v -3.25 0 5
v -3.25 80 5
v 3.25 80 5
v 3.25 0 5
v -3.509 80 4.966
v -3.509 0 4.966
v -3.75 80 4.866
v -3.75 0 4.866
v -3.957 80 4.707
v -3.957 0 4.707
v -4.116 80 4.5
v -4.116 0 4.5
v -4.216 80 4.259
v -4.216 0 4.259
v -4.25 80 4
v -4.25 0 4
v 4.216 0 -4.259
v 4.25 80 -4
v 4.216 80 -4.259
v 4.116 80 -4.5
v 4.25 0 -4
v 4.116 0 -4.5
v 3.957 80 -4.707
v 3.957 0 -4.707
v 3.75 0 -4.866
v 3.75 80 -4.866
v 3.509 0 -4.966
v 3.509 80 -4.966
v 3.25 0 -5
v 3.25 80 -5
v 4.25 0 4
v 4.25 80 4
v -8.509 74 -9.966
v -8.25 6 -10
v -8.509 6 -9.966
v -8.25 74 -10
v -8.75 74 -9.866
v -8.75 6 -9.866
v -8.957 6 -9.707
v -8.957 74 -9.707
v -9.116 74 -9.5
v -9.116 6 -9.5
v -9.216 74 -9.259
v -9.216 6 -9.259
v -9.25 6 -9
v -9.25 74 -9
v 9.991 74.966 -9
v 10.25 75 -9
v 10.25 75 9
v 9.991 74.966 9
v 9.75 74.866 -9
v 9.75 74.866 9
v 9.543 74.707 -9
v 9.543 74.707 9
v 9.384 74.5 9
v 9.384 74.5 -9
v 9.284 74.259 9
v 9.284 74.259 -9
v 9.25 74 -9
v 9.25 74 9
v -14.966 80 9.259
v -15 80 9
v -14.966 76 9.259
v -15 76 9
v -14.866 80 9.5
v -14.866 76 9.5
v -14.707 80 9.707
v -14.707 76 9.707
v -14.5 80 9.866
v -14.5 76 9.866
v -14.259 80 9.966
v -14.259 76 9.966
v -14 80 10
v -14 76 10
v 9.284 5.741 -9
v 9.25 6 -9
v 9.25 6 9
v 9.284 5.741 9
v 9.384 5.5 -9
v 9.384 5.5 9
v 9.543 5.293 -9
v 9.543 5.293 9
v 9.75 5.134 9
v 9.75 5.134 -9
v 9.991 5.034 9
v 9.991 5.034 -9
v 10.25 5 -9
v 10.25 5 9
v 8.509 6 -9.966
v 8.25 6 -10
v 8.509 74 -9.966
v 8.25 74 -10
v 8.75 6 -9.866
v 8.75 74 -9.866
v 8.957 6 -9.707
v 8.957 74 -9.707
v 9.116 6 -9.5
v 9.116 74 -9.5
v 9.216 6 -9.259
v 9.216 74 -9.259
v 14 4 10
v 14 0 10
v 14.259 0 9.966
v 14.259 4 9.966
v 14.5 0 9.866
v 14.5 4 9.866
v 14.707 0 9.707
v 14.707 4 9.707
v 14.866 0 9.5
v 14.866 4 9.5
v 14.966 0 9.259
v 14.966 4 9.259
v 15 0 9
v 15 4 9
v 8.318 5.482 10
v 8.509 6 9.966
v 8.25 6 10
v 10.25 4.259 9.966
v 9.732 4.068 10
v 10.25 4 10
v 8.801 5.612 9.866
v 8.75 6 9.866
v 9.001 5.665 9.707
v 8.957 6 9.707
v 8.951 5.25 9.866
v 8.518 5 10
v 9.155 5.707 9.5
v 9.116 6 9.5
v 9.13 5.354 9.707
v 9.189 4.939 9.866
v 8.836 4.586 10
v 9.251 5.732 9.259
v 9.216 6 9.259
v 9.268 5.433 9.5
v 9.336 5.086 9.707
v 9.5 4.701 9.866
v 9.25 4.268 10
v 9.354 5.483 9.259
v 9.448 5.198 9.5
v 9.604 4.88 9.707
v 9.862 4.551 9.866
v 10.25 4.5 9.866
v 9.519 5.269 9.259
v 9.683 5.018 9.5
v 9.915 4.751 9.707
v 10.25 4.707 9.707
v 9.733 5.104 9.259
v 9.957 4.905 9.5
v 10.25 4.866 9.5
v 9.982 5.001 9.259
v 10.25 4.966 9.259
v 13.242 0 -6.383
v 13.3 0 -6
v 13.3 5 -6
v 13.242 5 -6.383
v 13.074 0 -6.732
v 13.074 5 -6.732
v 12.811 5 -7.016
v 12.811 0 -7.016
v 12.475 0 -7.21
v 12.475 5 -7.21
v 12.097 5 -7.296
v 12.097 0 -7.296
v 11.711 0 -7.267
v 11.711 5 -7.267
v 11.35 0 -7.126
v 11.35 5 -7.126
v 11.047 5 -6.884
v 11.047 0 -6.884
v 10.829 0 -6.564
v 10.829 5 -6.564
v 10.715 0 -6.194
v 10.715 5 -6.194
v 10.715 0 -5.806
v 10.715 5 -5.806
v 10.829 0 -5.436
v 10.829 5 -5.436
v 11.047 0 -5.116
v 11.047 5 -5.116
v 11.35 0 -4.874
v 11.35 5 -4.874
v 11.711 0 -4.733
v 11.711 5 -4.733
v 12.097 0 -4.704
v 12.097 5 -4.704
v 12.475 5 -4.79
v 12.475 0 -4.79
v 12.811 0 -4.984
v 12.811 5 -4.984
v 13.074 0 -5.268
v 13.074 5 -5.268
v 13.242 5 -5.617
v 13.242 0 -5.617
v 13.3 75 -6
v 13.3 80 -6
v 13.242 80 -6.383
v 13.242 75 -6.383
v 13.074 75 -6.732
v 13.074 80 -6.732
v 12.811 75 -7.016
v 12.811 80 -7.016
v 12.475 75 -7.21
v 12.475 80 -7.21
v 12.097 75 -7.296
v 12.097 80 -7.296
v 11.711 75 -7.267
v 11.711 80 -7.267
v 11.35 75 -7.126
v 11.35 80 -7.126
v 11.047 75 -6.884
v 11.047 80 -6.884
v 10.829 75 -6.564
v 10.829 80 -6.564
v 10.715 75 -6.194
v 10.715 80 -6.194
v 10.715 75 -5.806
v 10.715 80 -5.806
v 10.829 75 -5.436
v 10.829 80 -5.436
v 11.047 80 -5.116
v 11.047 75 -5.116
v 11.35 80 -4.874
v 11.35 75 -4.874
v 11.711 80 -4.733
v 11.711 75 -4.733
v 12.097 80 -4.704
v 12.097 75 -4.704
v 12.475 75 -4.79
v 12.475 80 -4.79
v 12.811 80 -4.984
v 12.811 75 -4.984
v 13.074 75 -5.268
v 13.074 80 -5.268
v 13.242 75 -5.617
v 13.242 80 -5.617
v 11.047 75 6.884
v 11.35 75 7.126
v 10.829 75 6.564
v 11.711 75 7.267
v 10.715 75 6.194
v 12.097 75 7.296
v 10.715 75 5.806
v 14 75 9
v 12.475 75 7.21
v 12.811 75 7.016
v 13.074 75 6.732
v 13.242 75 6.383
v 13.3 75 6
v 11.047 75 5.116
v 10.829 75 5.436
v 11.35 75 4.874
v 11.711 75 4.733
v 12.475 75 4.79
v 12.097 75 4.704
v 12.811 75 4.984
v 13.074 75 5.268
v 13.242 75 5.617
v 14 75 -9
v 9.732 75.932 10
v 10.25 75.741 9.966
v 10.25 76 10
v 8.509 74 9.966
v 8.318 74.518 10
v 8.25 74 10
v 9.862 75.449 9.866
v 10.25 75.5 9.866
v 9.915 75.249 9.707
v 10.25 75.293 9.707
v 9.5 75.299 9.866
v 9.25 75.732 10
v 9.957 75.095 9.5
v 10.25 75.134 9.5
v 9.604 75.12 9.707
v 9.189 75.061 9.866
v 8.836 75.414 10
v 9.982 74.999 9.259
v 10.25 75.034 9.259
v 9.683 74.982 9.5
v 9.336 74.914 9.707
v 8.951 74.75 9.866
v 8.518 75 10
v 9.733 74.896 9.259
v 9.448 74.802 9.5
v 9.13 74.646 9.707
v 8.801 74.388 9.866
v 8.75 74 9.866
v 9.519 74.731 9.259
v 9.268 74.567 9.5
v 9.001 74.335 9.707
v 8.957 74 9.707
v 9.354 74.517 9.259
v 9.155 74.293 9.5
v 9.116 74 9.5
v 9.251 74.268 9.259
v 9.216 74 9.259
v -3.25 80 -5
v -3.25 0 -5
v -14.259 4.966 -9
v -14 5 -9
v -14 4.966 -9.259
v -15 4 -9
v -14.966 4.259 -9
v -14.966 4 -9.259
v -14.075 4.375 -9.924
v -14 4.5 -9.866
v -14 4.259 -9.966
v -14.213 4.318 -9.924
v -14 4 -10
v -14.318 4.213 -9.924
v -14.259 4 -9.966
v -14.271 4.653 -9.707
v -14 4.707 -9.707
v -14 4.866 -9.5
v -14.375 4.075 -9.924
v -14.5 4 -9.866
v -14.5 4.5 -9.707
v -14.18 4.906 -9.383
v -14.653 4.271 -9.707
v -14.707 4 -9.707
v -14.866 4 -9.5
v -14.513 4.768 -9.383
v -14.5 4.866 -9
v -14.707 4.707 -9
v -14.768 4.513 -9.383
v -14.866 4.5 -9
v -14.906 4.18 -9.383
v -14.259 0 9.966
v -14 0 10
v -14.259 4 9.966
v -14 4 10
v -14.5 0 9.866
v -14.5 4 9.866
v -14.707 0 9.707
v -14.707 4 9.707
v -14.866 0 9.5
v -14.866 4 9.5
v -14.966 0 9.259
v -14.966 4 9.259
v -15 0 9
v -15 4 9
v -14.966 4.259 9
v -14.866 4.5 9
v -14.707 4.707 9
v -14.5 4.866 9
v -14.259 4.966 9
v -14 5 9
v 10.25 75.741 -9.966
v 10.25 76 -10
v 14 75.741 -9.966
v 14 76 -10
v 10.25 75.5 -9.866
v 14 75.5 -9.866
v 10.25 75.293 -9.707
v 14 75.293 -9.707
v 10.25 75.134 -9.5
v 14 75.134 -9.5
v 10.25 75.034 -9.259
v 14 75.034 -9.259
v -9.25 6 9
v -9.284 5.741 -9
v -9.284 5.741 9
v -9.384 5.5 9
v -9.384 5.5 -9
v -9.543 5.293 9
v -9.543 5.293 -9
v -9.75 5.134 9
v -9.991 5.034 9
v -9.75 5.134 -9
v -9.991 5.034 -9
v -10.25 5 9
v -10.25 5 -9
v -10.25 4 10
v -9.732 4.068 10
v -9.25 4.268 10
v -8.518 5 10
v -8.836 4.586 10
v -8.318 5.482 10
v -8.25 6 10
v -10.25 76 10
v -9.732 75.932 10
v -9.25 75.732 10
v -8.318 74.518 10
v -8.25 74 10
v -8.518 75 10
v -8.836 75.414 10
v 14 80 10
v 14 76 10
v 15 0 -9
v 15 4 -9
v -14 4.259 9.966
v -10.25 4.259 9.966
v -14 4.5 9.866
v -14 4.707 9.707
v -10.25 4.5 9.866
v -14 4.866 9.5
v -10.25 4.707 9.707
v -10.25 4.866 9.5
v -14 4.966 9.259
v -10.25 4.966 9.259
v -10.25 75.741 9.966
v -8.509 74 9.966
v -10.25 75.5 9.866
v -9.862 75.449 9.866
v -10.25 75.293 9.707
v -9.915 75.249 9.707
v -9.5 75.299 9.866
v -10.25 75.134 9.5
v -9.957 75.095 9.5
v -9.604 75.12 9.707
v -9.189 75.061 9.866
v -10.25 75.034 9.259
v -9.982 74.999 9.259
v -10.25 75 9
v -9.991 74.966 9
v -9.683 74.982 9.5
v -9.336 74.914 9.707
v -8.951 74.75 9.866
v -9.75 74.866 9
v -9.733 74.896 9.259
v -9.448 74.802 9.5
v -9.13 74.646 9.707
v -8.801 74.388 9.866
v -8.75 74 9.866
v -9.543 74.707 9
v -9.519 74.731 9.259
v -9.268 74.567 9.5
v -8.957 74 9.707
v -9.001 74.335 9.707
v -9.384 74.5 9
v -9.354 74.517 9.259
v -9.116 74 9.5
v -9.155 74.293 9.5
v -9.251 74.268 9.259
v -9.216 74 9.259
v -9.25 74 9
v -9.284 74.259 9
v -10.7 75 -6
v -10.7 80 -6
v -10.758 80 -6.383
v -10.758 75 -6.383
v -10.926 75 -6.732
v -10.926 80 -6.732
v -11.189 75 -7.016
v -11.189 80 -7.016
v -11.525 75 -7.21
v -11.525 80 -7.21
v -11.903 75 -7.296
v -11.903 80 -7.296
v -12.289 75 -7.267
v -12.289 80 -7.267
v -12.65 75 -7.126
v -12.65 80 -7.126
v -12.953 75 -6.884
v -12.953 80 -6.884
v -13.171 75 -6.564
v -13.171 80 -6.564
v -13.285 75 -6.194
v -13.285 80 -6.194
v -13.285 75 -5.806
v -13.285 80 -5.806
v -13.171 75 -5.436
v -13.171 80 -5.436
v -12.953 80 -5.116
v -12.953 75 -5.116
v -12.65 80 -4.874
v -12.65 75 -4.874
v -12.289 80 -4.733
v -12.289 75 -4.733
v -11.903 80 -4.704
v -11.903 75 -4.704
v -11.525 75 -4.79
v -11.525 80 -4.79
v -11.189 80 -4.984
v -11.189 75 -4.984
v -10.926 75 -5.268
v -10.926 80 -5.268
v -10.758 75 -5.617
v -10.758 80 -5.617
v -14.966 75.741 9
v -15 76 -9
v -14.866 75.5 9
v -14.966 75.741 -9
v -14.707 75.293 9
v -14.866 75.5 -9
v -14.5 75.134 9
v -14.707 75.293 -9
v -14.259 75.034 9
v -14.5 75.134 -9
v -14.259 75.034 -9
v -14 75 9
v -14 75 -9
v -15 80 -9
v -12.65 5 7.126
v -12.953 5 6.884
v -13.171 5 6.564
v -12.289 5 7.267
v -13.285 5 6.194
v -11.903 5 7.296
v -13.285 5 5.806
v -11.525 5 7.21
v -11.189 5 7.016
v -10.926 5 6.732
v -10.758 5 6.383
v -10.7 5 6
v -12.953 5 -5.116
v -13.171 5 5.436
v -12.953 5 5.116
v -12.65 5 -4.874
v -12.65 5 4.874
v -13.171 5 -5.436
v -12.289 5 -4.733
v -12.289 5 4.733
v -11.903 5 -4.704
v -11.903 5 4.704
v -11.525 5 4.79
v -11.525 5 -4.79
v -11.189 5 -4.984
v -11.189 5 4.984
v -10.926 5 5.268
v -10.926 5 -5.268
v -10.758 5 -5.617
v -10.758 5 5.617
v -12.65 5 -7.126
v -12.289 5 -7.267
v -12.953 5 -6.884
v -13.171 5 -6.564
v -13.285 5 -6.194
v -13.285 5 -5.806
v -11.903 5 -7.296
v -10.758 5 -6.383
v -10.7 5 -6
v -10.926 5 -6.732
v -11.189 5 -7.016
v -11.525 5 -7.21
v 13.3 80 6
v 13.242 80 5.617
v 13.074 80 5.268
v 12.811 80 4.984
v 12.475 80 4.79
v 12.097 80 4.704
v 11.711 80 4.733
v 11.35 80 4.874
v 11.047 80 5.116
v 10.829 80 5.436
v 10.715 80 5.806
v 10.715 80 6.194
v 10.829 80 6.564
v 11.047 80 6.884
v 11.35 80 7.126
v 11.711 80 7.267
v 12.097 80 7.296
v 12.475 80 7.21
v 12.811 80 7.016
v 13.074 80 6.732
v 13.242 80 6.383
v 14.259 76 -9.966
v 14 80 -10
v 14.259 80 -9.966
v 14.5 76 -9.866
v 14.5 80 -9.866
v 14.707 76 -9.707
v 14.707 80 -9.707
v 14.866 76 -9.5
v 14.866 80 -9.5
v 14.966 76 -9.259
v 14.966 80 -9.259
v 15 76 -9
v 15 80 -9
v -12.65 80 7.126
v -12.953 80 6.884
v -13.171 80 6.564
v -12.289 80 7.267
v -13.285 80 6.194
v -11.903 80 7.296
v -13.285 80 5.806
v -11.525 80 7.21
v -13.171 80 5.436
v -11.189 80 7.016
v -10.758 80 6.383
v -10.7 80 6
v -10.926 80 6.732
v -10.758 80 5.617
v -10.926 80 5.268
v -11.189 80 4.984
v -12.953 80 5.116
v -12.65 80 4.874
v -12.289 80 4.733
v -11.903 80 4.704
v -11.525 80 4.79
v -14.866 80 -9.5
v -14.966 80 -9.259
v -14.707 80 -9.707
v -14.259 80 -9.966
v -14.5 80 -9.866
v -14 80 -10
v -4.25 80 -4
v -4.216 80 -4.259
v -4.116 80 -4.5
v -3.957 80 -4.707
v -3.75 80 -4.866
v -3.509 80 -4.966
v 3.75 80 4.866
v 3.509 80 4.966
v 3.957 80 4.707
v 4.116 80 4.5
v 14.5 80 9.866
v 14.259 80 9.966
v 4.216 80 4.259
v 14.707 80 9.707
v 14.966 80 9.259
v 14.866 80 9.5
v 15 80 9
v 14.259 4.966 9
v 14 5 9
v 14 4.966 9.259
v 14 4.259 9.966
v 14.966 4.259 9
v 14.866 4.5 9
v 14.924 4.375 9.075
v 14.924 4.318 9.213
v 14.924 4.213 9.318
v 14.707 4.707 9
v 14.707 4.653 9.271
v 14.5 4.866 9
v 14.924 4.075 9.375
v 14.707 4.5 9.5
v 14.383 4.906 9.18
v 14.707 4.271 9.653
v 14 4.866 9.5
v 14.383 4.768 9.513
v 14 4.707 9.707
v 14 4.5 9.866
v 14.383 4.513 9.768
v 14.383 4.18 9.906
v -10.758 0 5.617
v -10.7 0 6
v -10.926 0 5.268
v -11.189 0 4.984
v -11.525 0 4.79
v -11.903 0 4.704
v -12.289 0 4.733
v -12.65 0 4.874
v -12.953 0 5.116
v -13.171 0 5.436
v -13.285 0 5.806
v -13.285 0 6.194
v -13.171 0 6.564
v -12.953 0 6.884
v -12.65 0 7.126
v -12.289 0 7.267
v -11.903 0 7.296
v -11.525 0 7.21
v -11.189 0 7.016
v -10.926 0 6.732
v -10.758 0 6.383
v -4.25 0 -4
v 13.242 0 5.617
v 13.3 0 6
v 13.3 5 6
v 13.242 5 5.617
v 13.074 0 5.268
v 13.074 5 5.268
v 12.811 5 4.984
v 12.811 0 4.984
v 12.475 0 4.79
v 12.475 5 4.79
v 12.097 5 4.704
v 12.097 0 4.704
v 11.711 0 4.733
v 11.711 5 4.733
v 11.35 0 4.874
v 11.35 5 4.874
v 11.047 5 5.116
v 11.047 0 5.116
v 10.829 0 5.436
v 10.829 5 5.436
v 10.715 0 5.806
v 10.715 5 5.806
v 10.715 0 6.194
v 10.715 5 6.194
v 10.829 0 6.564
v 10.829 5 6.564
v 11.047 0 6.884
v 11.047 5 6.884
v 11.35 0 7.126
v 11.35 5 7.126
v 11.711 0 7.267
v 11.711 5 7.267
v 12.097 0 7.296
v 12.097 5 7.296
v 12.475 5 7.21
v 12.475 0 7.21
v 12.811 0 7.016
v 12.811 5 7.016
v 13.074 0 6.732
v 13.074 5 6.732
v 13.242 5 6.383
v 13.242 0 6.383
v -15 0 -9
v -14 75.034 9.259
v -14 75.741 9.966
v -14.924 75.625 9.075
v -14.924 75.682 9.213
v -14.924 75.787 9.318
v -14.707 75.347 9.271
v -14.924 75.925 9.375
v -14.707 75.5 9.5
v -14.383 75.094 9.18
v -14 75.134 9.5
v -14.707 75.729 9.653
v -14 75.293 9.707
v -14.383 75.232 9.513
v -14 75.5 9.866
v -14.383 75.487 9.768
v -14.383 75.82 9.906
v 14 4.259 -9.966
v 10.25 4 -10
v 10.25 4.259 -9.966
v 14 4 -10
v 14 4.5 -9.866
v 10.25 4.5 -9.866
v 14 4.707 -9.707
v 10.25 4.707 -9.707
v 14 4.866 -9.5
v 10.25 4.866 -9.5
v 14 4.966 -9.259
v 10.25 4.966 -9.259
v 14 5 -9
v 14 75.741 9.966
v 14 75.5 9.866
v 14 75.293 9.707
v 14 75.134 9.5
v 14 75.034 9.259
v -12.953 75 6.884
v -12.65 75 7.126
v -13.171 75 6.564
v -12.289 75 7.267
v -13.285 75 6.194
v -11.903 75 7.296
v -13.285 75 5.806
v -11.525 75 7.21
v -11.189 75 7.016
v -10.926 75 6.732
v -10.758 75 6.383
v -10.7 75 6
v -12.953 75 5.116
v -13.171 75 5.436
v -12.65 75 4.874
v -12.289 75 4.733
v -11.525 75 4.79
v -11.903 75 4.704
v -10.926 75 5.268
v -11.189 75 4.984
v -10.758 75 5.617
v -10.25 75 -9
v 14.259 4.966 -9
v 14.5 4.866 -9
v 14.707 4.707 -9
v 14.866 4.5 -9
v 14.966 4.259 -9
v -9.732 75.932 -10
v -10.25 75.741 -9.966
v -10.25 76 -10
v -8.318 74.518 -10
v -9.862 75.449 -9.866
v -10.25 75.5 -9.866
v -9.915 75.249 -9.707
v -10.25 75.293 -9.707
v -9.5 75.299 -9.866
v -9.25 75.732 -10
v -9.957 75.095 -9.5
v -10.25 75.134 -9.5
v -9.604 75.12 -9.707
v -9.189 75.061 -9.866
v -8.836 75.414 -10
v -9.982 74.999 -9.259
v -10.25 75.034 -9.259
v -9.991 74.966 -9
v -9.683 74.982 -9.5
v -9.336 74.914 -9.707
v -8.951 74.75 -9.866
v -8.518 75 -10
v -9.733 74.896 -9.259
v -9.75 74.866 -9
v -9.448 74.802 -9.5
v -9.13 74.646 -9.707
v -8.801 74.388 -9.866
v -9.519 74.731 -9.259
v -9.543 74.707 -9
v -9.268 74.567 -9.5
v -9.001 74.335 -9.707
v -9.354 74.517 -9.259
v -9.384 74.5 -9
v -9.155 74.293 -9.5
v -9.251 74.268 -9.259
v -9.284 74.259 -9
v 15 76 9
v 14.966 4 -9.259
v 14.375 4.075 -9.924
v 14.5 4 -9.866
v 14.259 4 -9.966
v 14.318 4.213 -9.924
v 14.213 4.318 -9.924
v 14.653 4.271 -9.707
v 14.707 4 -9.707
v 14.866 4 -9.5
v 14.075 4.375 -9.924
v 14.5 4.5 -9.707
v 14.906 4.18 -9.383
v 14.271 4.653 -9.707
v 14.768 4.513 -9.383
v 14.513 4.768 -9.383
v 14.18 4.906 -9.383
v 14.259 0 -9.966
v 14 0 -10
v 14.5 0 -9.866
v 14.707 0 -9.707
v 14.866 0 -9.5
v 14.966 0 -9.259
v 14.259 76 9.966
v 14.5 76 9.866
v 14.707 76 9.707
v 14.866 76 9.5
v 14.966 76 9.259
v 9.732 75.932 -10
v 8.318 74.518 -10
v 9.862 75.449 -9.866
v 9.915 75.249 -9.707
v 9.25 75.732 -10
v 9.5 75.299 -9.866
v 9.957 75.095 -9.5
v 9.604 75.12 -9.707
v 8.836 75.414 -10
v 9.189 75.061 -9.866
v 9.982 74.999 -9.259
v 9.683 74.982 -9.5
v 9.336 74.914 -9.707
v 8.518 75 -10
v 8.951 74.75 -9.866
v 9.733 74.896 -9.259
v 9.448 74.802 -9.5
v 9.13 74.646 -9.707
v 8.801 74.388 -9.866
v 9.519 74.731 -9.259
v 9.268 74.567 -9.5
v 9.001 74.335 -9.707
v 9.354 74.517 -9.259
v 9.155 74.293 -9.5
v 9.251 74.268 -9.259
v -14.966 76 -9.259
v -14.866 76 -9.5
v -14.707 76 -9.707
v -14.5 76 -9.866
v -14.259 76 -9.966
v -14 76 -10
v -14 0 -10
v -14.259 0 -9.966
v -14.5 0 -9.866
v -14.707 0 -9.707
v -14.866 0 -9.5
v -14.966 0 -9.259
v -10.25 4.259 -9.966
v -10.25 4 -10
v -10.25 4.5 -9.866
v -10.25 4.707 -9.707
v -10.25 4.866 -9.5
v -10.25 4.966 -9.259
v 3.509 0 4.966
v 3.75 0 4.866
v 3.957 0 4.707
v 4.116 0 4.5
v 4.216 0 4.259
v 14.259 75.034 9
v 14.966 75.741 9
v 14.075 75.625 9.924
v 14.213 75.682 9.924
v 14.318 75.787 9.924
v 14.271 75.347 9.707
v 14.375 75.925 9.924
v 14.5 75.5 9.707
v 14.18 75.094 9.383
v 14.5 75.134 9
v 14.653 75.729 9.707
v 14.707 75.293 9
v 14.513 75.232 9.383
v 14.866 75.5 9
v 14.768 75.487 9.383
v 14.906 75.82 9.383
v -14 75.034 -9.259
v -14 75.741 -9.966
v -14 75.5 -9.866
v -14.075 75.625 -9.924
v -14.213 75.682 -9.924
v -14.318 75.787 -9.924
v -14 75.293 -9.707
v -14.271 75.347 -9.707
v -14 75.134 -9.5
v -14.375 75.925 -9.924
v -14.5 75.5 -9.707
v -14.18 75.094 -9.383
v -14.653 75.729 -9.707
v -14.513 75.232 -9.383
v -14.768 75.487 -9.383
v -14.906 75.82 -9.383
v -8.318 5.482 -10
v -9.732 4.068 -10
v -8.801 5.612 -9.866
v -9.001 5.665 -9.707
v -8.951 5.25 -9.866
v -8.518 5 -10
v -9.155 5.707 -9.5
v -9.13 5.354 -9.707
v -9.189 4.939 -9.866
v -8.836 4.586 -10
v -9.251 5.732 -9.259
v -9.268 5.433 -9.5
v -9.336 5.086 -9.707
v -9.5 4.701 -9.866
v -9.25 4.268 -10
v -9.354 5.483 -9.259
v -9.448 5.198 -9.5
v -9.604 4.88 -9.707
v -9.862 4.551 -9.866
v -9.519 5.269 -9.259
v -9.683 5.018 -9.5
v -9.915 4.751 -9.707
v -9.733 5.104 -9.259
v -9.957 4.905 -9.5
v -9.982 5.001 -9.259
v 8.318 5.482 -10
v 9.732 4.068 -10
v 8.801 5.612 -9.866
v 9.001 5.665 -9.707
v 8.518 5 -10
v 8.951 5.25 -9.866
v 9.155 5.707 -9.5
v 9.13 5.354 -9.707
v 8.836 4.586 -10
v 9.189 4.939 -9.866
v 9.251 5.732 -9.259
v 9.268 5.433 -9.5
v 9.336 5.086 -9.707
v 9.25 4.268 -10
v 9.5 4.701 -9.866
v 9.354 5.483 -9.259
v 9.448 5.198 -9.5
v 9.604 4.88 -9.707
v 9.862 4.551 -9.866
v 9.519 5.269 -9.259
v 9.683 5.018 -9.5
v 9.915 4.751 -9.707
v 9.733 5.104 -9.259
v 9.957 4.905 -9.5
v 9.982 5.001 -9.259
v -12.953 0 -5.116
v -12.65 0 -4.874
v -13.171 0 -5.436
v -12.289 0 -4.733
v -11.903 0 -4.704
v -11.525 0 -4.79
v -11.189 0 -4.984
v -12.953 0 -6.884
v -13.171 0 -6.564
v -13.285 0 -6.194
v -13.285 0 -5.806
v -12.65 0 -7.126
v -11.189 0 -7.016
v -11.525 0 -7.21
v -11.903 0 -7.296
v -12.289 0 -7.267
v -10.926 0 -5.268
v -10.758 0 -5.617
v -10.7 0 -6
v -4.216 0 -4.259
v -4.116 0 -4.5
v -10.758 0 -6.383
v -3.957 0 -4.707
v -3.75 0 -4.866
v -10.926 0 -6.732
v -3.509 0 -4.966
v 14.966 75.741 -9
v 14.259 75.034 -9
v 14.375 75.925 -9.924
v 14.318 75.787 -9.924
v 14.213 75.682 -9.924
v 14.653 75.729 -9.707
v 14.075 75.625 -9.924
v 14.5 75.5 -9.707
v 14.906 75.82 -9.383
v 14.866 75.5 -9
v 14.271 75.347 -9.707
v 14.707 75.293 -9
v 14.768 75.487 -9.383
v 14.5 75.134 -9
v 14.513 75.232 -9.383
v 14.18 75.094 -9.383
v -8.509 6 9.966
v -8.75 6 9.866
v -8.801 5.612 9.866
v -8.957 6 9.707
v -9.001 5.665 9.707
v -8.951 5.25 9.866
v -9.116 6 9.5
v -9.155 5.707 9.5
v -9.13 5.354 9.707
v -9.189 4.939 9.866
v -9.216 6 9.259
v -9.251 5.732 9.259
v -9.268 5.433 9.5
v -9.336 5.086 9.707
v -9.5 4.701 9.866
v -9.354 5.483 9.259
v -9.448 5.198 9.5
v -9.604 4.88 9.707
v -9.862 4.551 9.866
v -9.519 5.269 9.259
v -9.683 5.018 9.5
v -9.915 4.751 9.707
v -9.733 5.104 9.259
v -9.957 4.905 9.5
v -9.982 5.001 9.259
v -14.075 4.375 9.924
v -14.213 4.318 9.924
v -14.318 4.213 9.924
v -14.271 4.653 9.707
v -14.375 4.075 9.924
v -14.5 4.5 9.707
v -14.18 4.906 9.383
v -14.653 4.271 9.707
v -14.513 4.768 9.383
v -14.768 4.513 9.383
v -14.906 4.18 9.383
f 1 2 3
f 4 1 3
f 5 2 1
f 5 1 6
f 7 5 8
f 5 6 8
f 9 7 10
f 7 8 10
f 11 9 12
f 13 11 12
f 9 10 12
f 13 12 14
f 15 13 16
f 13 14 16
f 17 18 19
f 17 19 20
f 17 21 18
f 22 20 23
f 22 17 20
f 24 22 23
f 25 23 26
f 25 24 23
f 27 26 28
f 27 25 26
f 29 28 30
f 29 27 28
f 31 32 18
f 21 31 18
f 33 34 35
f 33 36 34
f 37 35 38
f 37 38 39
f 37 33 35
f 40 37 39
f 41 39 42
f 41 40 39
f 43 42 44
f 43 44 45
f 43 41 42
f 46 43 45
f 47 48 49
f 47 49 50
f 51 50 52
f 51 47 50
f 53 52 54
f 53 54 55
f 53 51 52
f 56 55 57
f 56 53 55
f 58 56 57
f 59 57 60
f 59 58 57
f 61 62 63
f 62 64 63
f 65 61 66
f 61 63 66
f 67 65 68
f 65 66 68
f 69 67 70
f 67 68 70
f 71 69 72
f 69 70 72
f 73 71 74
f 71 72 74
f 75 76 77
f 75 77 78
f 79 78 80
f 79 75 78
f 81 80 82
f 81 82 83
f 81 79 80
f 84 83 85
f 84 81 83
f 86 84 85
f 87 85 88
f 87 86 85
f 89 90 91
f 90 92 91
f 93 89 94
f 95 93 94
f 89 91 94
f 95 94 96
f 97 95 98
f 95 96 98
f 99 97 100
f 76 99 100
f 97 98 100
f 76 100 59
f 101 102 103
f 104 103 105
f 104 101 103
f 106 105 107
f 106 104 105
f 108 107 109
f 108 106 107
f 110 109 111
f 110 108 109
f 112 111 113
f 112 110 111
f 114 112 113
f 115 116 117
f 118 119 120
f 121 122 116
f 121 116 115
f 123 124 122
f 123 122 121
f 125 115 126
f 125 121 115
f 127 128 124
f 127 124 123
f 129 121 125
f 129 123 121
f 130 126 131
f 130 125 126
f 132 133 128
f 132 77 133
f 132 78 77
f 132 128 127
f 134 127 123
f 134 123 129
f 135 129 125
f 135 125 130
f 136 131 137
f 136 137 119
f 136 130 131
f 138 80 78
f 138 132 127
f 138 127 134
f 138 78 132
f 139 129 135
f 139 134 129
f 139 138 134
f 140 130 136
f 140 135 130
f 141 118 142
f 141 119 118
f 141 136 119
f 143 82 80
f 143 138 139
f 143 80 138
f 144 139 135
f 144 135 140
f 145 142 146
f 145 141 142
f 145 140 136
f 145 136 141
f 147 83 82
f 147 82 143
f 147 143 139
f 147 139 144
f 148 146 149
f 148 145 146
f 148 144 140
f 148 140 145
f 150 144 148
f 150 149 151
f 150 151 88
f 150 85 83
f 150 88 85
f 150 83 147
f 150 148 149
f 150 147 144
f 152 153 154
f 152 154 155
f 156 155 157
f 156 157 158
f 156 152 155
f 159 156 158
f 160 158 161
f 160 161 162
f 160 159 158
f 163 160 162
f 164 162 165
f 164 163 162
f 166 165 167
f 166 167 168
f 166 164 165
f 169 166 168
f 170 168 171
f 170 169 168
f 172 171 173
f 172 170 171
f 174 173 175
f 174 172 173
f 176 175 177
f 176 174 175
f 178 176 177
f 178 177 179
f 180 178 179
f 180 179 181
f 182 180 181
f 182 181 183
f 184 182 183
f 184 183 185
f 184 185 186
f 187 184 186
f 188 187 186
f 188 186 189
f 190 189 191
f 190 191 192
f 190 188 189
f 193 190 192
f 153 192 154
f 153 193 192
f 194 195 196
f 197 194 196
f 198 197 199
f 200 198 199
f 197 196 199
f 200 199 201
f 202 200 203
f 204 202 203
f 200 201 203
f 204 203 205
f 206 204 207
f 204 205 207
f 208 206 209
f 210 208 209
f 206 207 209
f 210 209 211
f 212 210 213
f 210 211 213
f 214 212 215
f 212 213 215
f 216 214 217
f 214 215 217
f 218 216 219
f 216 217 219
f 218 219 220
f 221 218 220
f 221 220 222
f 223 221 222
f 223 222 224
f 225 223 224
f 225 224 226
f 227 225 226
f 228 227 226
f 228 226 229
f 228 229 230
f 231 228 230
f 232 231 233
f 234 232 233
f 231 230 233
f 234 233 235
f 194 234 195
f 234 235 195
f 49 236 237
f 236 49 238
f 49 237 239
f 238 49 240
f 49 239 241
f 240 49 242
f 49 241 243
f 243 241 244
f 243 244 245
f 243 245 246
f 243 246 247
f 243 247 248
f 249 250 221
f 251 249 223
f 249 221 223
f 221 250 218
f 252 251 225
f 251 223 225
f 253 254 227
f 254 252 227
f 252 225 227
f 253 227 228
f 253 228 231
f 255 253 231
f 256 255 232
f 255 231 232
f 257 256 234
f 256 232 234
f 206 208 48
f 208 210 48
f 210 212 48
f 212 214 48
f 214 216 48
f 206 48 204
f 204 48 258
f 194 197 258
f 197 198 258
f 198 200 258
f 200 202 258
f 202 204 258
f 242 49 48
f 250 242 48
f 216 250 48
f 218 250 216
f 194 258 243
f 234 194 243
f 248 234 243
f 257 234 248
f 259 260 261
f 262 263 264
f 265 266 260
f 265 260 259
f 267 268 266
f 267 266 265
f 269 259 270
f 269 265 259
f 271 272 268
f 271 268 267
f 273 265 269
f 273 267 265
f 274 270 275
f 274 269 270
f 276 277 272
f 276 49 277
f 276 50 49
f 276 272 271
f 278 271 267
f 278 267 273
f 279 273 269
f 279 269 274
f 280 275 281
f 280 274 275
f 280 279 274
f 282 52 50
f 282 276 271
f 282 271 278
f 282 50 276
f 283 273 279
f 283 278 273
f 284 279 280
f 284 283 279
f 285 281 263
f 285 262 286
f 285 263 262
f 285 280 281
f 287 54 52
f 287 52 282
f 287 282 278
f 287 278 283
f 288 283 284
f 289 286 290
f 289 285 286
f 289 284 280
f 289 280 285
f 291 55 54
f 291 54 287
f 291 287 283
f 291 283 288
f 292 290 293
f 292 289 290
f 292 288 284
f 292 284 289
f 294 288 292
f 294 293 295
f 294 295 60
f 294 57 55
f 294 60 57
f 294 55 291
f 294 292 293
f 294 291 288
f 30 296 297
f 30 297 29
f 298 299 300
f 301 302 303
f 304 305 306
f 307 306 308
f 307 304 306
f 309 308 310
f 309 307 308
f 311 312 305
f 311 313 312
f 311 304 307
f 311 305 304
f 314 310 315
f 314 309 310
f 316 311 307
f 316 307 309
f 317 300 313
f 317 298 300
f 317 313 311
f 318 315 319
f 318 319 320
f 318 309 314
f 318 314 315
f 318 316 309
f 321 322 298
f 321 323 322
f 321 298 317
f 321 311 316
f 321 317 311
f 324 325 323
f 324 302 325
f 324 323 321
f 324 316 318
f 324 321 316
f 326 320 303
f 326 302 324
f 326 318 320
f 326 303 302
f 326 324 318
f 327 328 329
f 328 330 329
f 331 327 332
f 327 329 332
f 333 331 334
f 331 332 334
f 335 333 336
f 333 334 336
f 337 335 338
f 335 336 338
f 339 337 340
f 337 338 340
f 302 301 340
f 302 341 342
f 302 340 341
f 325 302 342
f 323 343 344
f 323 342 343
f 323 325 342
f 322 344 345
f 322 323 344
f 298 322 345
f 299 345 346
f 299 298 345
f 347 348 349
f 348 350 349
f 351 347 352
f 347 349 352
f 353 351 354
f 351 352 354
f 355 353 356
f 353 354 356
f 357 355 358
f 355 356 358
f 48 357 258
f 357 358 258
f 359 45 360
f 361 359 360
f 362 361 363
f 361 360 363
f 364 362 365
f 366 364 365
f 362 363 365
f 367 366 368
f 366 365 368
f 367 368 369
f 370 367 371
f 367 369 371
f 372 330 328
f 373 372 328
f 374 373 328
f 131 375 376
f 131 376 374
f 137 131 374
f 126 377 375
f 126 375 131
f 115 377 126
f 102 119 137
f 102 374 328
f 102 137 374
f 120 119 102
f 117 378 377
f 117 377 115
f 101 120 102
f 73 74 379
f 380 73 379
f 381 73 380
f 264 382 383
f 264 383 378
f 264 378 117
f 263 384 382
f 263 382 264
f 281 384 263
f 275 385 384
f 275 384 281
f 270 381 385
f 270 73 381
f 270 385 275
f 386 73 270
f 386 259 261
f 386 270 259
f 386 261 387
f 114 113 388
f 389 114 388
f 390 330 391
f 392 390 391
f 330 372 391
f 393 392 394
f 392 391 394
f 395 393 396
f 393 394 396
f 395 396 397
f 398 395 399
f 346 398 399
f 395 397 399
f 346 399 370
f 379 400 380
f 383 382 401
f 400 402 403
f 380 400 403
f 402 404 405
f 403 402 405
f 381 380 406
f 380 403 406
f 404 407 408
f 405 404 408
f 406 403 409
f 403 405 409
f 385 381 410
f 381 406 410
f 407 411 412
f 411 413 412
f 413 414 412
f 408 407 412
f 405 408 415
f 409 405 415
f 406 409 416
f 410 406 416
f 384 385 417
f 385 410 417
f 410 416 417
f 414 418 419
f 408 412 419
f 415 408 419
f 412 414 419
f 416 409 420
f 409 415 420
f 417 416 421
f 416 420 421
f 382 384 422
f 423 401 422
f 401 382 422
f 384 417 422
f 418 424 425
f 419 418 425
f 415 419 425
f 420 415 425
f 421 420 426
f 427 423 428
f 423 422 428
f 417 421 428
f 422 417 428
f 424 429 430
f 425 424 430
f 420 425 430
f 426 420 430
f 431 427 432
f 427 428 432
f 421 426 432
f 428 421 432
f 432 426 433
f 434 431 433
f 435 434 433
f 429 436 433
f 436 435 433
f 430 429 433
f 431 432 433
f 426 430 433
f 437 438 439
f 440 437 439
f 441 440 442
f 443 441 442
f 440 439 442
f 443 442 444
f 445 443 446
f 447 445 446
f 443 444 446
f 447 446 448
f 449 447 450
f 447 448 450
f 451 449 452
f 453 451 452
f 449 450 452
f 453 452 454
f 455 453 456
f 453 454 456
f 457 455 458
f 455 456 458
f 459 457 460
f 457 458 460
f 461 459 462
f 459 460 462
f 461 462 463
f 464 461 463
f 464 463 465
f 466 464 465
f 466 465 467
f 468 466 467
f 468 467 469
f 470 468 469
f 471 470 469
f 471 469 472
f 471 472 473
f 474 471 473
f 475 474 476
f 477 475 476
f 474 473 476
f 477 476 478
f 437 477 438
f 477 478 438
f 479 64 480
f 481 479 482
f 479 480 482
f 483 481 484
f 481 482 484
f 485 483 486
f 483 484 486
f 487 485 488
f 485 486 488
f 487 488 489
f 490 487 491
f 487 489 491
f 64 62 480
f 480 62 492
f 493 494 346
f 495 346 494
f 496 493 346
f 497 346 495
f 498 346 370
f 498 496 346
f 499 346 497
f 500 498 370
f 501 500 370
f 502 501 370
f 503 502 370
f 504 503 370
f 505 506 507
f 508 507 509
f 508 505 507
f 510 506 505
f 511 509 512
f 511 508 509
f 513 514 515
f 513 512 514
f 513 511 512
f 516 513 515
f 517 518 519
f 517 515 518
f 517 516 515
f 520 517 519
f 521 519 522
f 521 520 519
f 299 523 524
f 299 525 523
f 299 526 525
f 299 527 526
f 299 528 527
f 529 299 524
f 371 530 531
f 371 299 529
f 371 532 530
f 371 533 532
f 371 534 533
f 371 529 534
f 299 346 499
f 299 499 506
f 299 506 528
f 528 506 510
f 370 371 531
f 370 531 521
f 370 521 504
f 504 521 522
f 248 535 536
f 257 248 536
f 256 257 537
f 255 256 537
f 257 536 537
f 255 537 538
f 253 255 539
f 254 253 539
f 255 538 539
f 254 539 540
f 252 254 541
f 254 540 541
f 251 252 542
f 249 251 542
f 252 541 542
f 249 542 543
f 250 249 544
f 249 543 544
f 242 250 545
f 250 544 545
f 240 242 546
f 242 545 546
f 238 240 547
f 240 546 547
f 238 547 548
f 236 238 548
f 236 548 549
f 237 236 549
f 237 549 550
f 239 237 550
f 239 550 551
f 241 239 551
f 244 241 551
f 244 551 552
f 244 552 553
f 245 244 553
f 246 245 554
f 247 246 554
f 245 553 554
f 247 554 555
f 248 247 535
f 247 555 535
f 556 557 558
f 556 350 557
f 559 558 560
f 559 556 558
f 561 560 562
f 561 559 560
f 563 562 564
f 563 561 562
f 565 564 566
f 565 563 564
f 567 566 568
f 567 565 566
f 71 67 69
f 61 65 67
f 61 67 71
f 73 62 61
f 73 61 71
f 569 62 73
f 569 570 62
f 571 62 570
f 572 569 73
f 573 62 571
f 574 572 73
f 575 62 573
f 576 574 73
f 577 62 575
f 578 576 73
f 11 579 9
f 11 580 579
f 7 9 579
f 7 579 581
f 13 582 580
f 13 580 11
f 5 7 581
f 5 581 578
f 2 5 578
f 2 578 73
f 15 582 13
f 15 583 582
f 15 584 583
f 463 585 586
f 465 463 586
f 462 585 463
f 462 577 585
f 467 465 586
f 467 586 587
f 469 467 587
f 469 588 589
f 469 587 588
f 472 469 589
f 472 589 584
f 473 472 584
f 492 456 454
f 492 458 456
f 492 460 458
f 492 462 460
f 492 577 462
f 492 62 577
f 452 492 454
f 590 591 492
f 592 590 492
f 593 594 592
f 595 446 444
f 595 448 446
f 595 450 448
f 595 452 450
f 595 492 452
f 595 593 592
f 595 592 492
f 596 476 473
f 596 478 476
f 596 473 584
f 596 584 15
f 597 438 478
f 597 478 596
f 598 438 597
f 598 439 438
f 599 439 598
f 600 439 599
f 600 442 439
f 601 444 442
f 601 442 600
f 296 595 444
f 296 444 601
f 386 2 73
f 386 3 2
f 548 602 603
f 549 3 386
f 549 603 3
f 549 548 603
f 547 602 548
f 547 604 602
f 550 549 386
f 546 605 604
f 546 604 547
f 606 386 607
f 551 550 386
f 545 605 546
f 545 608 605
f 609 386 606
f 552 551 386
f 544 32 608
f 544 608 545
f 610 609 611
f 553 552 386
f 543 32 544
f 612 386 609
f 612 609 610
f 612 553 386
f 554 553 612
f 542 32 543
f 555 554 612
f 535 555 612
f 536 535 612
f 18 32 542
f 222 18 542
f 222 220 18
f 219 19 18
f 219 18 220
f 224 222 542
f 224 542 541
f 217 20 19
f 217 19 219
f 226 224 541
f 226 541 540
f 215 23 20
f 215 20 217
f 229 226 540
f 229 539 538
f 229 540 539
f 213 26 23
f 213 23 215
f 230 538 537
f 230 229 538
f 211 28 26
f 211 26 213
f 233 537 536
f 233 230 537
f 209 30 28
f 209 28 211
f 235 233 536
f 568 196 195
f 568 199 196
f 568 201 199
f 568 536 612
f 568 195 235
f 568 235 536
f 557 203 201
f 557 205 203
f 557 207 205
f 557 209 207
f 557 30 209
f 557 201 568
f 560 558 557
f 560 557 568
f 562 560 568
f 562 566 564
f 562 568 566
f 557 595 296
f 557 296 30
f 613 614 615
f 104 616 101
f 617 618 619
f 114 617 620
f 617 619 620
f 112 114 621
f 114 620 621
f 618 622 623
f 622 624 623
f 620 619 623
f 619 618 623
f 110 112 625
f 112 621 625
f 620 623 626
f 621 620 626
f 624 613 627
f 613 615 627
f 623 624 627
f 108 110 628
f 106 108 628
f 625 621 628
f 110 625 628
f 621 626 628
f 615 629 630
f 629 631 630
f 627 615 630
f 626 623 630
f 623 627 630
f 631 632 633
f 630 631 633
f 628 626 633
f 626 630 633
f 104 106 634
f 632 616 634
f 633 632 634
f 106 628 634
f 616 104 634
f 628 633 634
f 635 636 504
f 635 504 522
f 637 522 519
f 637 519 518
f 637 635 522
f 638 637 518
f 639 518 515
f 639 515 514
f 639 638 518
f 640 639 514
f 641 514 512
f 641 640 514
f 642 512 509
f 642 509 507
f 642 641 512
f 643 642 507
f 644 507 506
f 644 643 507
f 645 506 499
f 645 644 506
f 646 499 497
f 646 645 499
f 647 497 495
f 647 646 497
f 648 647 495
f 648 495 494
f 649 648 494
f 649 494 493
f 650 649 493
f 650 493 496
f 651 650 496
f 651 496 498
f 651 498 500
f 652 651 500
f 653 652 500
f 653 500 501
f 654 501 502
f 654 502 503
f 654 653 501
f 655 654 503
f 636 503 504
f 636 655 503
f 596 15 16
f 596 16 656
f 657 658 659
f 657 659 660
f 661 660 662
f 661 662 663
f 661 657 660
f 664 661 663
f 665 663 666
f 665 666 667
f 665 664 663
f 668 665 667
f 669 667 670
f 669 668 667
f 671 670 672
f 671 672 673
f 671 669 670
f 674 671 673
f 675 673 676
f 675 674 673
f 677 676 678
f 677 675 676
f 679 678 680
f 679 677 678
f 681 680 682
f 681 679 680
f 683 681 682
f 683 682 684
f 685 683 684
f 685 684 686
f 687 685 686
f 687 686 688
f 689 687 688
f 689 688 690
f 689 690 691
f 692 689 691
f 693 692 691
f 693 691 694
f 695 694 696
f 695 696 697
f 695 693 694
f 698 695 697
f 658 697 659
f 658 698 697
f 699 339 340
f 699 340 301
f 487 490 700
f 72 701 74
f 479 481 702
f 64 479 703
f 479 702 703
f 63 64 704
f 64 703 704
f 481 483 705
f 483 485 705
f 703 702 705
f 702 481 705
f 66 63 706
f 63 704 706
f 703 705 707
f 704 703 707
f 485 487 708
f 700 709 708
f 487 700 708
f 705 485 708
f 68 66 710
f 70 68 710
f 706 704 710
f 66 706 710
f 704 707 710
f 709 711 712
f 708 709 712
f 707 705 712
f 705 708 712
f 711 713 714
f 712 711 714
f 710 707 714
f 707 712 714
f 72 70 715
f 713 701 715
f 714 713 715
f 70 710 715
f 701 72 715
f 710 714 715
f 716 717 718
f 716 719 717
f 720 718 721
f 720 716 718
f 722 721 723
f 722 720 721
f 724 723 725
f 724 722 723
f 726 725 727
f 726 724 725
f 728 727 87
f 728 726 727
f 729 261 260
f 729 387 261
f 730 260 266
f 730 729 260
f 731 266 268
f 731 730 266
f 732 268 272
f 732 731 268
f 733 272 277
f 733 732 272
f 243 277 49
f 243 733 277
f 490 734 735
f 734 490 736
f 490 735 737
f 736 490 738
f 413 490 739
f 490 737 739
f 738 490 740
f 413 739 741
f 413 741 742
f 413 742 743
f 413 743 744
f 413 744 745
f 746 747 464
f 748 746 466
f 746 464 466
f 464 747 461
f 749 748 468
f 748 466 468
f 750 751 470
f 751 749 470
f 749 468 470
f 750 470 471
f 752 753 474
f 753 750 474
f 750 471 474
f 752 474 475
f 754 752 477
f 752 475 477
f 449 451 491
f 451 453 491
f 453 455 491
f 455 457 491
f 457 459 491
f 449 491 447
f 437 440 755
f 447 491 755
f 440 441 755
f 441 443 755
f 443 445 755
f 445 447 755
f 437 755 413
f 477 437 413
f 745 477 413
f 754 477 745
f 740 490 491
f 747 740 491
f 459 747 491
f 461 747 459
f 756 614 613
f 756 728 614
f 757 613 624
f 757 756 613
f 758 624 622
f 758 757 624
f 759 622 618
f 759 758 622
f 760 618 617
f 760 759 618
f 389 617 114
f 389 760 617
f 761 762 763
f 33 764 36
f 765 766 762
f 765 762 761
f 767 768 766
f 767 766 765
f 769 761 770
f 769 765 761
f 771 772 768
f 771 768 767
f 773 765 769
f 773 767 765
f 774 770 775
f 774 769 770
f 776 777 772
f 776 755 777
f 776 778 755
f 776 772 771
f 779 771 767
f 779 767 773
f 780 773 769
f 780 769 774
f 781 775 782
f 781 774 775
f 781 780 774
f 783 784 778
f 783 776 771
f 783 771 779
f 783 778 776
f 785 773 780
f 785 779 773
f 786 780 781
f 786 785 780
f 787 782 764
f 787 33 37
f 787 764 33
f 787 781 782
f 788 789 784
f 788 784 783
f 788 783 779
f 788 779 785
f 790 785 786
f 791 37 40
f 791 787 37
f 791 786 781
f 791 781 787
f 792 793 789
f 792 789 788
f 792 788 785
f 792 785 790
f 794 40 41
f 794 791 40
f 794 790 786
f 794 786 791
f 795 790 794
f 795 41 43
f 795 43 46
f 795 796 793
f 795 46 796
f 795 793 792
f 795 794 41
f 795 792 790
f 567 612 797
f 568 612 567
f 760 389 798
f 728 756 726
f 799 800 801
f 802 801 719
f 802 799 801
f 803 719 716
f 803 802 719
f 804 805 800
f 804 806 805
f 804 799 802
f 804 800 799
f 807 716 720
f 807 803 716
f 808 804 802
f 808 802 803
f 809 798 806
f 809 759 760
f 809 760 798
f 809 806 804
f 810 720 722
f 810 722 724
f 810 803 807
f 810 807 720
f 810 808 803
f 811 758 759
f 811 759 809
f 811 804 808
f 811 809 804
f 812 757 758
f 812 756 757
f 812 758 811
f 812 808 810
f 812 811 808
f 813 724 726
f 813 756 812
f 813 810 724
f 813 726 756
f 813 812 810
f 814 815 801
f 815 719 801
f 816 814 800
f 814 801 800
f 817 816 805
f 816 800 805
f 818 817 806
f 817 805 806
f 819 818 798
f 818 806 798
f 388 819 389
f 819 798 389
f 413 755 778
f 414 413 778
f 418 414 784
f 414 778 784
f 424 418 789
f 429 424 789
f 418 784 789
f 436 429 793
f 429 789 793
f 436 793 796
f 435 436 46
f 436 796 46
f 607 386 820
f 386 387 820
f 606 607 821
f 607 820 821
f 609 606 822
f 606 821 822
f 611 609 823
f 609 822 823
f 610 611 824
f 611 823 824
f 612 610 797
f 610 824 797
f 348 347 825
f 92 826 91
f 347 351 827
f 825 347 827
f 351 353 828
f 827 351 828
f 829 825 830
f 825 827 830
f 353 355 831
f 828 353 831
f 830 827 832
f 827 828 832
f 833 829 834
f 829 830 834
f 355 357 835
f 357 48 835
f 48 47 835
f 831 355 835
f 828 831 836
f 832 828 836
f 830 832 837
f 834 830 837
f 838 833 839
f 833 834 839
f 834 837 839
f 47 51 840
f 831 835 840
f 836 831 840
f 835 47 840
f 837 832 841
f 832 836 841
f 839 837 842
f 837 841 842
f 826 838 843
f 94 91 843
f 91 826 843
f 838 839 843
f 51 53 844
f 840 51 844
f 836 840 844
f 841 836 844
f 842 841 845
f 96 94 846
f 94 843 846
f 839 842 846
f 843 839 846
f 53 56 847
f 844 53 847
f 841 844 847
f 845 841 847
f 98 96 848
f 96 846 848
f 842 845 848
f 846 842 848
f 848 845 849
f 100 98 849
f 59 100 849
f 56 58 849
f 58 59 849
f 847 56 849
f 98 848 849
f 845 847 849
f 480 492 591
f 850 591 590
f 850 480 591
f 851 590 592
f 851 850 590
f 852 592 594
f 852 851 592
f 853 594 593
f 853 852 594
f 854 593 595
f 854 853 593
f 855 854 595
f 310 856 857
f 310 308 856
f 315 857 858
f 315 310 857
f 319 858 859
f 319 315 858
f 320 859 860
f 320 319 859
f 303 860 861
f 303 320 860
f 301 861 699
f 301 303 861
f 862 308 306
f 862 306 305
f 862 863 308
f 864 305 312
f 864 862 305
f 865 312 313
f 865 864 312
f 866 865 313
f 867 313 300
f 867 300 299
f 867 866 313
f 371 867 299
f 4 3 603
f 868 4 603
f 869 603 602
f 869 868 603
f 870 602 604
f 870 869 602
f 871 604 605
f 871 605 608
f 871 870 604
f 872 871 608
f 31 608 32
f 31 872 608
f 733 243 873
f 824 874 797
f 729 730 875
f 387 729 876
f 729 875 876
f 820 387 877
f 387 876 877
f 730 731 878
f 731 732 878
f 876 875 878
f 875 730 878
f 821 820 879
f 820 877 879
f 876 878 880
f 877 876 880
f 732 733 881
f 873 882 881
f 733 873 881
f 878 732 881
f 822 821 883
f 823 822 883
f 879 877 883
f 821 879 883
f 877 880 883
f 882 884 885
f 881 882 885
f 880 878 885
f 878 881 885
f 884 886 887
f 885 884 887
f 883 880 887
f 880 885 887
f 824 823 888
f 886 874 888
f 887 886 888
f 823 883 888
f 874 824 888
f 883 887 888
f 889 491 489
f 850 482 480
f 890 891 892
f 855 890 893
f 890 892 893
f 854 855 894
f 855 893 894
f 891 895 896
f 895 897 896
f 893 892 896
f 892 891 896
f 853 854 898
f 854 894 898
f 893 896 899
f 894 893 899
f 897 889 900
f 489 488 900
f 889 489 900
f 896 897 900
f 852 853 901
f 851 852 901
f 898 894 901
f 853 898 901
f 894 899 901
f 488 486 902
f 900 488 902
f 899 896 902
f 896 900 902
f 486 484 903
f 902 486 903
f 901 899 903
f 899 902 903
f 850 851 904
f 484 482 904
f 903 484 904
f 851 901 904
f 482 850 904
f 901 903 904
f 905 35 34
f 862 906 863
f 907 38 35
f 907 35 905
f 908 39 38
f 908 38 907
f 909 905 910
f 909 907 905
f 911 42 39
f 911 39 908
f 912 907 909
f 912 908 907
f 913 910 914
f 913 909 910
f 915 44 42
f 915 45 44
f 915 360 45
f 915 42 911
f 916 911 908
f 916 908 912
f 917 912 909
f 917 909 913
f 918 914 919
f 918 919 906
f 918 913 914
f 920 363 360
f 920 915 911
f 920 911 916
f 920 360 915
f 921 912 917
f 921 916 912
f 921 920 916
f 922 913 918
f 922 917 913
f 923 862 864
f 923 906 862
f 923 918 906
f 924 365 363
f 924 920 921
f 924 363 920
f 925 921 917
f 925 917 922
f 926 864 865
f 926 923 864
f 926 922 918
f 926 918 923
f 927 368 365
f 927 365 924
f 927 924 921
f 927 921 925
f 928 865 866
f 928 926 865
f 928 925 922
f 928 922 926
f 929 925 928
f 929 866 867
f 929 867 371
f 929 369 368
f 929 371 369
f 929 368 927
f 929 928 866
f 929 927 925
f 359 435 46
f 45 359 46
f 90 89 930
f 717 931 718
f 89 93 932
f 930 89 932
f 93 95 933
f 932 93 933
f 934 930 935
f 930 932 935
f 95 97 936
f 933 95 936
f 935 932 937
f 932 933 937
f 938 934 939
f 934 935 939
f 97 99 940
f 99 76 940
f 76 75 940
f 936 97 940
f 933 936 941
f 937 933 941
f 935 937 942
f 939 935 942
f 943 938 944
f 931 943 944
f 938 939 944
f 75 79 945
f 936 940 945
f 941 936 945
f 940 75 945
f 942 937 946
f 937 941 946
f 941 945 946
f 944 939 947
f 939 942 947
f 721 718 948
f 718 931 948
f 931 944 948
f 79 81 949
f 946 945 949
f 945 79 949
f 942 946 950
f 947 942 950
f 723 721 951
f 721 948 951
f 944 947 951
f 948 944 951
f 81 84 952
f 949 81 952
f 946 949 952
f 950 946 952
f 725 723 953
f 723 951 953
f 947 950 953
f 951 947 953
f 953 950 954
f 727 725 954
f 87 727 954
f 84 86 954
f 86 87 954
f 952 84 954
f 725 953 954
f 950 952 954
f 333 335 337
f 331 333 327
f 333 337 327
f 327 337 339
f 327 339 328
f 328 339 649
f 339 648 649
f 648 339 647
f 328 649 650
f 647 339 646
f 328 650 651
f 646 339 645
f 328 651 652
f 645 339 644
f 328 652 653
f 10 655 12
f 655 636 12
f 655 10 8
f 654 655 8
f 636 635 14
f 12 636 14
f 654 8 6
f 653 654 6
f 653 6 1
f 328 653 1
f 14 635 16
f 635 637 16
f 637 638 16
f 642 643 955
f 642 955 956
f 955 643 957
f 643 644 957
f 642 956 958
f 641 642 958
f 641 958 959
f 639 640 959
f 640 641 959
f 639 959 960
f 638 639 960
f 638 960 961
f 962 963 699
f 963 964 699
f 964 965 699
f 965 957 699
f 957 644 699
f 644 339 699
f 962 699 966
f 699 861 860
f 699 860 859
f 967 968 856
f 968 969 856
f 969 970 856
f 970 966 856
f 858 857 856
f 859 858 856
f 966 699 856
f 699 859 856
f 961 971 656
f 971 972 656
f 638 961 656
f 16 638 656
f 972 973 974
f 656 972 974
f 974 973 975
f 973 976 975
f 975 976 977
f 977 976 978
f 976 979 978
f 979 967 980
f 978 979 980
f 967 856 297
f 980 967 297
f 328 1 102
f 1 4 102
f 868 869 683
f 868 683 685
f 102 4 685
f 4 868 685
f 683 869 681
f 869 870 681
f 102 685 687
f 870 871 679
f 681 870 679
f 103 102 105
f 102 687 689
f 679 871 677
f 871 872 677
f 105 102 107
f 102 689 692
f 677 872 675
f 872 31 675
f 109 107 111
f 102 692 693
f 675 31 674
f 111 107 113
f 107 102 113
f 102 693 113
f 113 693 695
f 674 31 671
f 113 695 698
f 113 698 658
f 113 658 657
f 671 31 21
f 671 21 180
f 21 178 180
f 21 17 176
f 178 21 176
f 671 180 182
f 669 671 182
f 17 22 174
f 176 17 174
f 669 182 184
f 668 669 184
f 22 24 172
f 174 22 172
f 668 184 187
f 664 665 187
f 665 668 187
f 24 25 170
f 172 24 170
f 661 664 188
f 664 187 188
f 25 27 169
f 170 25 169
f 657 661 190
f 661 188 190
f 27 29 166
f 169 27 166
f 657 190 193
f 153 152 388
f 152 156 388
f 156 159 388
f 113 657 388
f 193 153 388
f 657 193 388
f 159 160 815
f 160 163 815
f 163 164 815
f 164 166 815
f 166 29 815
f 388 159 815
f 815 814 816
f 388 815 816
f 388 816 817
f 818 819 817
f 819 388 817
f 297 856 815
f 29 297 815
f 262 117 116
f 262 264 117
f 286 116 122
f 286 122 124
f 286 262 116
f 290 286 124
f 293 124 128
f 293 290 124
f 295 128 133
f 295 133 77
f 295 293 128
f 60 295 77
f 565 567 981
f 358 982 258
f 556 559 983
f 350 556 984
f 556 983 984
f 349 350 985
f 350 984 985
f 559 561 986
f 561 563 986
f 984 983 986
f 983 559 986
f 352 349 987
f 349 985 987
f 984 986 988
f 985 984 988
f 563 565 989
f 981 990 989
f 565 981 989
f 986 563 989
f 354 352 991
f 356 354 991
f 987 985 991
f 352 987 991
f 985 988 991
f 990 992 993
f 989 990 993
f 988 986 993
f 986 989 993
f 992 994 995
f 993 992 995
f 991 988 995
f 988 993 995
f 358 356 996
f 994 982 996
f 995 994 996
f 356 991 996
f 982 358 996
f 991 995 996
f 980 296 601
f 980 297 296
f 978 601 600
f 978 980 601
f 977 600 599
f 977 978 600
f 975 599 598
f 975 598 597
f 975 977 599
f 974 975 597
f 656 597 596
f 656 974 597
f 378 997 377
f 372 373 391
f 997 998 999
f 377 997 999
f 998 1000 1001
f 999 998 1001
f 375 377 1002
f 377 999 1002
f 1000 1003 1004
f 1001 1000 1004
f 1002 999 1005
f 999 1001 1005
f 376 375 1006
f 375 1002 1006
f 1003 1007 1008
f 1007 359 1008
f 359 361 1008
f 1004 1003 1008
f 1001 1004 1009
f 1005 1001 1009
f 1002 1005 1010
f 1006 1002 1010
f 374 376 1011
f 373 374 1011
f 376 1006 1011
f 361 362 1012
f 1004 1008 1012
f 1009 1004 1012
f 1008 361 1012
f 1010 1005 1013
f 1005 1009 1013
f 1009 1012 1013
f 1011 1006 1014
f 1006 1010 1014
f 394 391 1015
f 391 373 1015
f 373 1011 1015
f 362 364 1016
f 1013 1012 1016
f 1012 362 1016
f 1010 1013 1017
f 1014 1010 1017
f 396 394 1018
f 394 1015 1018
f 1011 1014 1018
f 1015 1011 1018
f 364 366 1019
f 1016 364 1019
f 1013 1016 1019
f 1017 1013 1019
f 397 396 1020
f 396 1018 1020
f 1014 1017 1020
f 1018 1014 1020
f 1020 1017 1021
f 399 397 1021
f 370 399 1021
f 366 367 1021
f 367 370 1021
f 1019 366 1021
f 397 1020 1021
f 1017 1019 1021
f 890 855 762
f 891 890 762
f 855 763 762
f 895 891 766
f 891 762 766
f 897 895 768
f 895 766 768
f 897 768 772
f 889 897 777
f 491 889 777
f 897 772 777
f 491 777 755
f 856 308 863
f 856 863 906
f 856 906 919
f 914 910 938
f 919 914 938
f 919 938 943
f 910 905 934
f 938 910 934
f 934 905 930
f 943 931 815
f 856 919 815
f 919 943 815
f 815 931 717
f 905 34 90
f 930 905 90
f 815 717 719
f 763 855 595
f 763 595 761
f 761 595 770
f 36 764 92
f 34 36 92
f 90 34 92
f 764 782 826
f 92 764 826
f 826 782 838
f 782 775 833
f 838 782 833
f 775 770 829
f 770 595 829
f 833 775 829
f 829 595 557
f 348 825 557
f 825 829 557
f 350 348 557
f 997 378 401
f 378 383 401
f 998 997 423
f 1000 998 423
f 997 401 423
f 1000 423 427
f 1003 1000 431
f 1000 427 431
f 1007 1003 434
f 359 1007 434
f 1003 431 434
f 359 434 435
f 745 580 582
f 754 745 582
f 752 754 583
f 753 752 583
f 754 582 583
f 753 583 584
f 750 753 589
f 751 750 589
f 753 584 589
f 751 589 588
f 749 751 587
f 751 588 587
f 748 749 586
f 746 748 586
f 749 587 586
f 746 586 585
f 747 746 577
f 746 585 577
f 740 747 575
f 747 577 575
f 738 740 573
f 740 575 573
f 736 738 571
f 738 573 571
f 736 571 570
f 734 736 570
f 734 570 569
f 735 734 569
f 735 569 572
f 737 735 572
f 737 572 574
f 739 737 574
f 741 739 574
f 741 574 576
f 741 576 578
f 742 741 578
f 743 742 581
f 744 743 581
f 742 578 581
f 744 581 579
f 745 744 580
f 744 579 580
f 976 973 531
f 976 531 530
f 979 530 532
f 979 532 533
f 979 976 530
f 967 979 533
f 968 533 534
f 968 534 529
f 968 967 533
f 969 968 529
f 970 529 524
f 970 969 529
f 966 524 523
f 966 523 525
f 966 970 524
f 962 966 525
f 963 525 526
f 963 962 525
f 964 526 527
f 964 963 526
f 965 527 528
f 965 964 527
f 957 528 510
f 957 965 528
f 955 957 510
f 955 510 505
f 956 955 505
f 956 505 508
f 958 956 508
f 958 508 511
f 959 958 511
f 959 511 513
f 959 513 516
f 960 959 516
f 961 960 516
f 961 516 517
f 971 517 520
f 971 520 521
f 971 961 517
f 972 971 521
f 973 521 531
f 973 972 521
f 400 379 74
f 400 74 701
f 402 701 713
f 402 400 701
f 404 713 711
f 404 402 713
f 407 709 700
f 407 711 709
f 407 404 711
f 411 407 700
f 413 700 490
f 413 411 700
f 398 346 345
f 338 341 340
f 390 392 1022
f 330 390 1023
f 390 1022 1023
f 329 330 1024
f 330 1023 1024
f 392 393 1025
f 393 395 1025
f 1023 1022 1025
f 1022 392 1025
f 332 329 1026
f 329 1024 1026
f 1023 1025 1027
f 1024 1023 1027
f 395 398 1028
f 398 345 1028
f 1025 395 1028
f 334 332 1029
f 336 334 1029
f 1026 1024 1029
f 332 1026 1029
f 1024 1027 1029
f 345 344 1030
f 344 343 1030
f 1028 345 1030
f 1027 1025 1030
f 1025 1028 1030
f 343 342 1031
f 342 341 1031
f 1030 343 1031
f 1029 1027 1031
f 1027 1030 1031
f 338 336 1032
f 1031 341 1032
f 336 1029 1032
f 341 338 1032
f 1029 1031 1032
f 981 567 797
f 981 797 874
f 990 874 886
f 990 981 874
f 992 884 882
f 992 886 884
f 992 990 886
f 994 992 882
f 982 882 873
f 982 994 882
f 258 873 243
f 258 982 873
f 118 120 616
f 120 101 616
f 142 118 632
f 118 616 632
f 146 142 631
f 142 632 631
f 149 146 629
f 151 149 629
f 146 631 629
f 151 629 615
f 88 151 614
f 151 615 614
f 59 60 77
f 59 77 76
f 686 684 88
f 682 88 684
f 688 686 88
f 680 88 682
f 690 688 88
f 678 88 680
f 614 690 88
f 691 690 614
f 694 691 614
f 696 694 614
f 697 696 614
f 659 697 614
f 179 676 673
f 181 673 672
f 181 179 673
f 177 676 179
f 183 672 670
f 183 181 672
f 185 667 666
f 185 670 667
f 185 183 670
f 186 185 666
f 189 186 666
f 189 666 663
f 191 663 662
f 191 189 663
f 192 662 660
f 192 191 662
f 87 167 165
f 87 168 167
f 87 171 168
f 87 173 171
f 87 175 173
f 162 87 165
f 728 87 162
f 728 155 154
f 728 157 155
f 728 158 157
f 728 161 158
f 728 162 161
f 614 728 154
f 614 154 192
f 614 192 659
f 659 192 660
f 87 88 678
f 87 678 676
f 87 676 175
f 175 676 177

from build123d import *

# Parameters (mm, degrees)
SKETCH1_W           = 30
SKETCH1_H           = 20
SKETCH1_R           = 1.3
BOSS_EXTRUDE1_DEPTH = 5
SKETCH2_W           = 18.5
SKETCH2_H           = 20
BOSS_EXTRUDE2_DEPTH = 70
FILLET1_R           = 1
SKETCH12_W          = 8.5
SKETCH12_H          = 10
CUT_EXTRUDE1_DEPTH  = 81
FILLET2_R           = 1


with BuildPart() as part:
    # Sketch1 → Boss-Extrude1 (new body)
    with BuildSketch(Plane(origin=(0, 0, 0), x_dir=(1, 0, 0), z_dir=(0, 1, 0))):
        Rectangle(SKETCH1_W, SKETCH1_H)
        with Locations((-12, 6)):
            Circle(SKETCH1_R, mode=Mode.SUBTRACT)
        with Locations((12, 6)):
            Circle(SKETCH1_R, mode=Mode.SUBTRACT)
        with Locations((12, -6)):
            Circle(SKETCH1_R, mode=Mode.SUBTRACT)
        with Locations((-12, -6)):
            Circle(SKETCH1_R, mode=Mode.SUBTRACT)
    boss_extrude1 = extrude(amount=BOSS_EXTRUDE1_DEPTH)

    # Sketch2 → Boss-Extrude2 (add)
    with BuildSketch(Plane(origin=(0, 5, 0), x_dir=(1, 0, 0), z_dir=(0, 1, 0))):
        Rectangle(SKETCH2_W, SKETCH2_H)
    extrude(amount=BOSS_EXTRUDE2_DEPTH)

    # Mirror1: Boss-Extrude1 across plane
    add(boss_extrude1.mirror(Plane.ZX.offset(40)))

    # Fillet1
    fillet1_edges = [part.edges().sort_by_distance(p)[0] for p in [
        (-15, 5, 0),
        (-12.125, 5, 10),
        (-12.125, 5, -10),
        (12.125, 5, 10),
        (9.25, 5, 0),
        (9.25, 40, 10),
        (9.25, 40, -10),
        (-9.25, 5, 0),
        (-9.25, 40, -10),
        (-9.25, 40, 10),
        (9.25, 75, 0),
        (-9.25, 75, 0),
        (15, 75, 0),
        (15, 77.5, -10),
        (-12.125, 75, 10),
        (12.125, 75, 10),
        (15, 77.5, 10),
        (-15, 75, 0),
        (-15, 77.5, 10),
        (12.125, 75, -10),
        (-12.125, 75, -10),
        (-15, 77.5, -10),
        (15, 5, 0),
        (15, 2.5, 10),
        (-15, 2.5, 10),
        (-15, 2.5, -10),
        (15, 2.5, -10),
        (12.125, 5, -10),
    ]]
    fillet(fillet1_edges, radius=FILLET1_R)

    # Sketch12 → Cut-Extrude1 (cut, through all)
    with BuildSketch(Plane(origin=(0, 80, 0), x_dir=(1, 0, 0), z_dir=(0, 1, 0))):
        Rectangle(SKETCH12_W, SKETCH12_H)
    extrude(amount=-CUT_EXTRUDE1_DEPTH, mode=Mode.SUBTRACT)

    # Fillet2
    fillet2_edges = [part.edges().sort_by_distance(p)[0] for p in [
        (4.25, 40, 5),
        (-4.25, 40, 5),
        (-4.25, 40, -5),
        (4.25, 40, -5),
    ]]
    fillet(fillet2_edges, radius=FILLET2_R)


solid = part.part
